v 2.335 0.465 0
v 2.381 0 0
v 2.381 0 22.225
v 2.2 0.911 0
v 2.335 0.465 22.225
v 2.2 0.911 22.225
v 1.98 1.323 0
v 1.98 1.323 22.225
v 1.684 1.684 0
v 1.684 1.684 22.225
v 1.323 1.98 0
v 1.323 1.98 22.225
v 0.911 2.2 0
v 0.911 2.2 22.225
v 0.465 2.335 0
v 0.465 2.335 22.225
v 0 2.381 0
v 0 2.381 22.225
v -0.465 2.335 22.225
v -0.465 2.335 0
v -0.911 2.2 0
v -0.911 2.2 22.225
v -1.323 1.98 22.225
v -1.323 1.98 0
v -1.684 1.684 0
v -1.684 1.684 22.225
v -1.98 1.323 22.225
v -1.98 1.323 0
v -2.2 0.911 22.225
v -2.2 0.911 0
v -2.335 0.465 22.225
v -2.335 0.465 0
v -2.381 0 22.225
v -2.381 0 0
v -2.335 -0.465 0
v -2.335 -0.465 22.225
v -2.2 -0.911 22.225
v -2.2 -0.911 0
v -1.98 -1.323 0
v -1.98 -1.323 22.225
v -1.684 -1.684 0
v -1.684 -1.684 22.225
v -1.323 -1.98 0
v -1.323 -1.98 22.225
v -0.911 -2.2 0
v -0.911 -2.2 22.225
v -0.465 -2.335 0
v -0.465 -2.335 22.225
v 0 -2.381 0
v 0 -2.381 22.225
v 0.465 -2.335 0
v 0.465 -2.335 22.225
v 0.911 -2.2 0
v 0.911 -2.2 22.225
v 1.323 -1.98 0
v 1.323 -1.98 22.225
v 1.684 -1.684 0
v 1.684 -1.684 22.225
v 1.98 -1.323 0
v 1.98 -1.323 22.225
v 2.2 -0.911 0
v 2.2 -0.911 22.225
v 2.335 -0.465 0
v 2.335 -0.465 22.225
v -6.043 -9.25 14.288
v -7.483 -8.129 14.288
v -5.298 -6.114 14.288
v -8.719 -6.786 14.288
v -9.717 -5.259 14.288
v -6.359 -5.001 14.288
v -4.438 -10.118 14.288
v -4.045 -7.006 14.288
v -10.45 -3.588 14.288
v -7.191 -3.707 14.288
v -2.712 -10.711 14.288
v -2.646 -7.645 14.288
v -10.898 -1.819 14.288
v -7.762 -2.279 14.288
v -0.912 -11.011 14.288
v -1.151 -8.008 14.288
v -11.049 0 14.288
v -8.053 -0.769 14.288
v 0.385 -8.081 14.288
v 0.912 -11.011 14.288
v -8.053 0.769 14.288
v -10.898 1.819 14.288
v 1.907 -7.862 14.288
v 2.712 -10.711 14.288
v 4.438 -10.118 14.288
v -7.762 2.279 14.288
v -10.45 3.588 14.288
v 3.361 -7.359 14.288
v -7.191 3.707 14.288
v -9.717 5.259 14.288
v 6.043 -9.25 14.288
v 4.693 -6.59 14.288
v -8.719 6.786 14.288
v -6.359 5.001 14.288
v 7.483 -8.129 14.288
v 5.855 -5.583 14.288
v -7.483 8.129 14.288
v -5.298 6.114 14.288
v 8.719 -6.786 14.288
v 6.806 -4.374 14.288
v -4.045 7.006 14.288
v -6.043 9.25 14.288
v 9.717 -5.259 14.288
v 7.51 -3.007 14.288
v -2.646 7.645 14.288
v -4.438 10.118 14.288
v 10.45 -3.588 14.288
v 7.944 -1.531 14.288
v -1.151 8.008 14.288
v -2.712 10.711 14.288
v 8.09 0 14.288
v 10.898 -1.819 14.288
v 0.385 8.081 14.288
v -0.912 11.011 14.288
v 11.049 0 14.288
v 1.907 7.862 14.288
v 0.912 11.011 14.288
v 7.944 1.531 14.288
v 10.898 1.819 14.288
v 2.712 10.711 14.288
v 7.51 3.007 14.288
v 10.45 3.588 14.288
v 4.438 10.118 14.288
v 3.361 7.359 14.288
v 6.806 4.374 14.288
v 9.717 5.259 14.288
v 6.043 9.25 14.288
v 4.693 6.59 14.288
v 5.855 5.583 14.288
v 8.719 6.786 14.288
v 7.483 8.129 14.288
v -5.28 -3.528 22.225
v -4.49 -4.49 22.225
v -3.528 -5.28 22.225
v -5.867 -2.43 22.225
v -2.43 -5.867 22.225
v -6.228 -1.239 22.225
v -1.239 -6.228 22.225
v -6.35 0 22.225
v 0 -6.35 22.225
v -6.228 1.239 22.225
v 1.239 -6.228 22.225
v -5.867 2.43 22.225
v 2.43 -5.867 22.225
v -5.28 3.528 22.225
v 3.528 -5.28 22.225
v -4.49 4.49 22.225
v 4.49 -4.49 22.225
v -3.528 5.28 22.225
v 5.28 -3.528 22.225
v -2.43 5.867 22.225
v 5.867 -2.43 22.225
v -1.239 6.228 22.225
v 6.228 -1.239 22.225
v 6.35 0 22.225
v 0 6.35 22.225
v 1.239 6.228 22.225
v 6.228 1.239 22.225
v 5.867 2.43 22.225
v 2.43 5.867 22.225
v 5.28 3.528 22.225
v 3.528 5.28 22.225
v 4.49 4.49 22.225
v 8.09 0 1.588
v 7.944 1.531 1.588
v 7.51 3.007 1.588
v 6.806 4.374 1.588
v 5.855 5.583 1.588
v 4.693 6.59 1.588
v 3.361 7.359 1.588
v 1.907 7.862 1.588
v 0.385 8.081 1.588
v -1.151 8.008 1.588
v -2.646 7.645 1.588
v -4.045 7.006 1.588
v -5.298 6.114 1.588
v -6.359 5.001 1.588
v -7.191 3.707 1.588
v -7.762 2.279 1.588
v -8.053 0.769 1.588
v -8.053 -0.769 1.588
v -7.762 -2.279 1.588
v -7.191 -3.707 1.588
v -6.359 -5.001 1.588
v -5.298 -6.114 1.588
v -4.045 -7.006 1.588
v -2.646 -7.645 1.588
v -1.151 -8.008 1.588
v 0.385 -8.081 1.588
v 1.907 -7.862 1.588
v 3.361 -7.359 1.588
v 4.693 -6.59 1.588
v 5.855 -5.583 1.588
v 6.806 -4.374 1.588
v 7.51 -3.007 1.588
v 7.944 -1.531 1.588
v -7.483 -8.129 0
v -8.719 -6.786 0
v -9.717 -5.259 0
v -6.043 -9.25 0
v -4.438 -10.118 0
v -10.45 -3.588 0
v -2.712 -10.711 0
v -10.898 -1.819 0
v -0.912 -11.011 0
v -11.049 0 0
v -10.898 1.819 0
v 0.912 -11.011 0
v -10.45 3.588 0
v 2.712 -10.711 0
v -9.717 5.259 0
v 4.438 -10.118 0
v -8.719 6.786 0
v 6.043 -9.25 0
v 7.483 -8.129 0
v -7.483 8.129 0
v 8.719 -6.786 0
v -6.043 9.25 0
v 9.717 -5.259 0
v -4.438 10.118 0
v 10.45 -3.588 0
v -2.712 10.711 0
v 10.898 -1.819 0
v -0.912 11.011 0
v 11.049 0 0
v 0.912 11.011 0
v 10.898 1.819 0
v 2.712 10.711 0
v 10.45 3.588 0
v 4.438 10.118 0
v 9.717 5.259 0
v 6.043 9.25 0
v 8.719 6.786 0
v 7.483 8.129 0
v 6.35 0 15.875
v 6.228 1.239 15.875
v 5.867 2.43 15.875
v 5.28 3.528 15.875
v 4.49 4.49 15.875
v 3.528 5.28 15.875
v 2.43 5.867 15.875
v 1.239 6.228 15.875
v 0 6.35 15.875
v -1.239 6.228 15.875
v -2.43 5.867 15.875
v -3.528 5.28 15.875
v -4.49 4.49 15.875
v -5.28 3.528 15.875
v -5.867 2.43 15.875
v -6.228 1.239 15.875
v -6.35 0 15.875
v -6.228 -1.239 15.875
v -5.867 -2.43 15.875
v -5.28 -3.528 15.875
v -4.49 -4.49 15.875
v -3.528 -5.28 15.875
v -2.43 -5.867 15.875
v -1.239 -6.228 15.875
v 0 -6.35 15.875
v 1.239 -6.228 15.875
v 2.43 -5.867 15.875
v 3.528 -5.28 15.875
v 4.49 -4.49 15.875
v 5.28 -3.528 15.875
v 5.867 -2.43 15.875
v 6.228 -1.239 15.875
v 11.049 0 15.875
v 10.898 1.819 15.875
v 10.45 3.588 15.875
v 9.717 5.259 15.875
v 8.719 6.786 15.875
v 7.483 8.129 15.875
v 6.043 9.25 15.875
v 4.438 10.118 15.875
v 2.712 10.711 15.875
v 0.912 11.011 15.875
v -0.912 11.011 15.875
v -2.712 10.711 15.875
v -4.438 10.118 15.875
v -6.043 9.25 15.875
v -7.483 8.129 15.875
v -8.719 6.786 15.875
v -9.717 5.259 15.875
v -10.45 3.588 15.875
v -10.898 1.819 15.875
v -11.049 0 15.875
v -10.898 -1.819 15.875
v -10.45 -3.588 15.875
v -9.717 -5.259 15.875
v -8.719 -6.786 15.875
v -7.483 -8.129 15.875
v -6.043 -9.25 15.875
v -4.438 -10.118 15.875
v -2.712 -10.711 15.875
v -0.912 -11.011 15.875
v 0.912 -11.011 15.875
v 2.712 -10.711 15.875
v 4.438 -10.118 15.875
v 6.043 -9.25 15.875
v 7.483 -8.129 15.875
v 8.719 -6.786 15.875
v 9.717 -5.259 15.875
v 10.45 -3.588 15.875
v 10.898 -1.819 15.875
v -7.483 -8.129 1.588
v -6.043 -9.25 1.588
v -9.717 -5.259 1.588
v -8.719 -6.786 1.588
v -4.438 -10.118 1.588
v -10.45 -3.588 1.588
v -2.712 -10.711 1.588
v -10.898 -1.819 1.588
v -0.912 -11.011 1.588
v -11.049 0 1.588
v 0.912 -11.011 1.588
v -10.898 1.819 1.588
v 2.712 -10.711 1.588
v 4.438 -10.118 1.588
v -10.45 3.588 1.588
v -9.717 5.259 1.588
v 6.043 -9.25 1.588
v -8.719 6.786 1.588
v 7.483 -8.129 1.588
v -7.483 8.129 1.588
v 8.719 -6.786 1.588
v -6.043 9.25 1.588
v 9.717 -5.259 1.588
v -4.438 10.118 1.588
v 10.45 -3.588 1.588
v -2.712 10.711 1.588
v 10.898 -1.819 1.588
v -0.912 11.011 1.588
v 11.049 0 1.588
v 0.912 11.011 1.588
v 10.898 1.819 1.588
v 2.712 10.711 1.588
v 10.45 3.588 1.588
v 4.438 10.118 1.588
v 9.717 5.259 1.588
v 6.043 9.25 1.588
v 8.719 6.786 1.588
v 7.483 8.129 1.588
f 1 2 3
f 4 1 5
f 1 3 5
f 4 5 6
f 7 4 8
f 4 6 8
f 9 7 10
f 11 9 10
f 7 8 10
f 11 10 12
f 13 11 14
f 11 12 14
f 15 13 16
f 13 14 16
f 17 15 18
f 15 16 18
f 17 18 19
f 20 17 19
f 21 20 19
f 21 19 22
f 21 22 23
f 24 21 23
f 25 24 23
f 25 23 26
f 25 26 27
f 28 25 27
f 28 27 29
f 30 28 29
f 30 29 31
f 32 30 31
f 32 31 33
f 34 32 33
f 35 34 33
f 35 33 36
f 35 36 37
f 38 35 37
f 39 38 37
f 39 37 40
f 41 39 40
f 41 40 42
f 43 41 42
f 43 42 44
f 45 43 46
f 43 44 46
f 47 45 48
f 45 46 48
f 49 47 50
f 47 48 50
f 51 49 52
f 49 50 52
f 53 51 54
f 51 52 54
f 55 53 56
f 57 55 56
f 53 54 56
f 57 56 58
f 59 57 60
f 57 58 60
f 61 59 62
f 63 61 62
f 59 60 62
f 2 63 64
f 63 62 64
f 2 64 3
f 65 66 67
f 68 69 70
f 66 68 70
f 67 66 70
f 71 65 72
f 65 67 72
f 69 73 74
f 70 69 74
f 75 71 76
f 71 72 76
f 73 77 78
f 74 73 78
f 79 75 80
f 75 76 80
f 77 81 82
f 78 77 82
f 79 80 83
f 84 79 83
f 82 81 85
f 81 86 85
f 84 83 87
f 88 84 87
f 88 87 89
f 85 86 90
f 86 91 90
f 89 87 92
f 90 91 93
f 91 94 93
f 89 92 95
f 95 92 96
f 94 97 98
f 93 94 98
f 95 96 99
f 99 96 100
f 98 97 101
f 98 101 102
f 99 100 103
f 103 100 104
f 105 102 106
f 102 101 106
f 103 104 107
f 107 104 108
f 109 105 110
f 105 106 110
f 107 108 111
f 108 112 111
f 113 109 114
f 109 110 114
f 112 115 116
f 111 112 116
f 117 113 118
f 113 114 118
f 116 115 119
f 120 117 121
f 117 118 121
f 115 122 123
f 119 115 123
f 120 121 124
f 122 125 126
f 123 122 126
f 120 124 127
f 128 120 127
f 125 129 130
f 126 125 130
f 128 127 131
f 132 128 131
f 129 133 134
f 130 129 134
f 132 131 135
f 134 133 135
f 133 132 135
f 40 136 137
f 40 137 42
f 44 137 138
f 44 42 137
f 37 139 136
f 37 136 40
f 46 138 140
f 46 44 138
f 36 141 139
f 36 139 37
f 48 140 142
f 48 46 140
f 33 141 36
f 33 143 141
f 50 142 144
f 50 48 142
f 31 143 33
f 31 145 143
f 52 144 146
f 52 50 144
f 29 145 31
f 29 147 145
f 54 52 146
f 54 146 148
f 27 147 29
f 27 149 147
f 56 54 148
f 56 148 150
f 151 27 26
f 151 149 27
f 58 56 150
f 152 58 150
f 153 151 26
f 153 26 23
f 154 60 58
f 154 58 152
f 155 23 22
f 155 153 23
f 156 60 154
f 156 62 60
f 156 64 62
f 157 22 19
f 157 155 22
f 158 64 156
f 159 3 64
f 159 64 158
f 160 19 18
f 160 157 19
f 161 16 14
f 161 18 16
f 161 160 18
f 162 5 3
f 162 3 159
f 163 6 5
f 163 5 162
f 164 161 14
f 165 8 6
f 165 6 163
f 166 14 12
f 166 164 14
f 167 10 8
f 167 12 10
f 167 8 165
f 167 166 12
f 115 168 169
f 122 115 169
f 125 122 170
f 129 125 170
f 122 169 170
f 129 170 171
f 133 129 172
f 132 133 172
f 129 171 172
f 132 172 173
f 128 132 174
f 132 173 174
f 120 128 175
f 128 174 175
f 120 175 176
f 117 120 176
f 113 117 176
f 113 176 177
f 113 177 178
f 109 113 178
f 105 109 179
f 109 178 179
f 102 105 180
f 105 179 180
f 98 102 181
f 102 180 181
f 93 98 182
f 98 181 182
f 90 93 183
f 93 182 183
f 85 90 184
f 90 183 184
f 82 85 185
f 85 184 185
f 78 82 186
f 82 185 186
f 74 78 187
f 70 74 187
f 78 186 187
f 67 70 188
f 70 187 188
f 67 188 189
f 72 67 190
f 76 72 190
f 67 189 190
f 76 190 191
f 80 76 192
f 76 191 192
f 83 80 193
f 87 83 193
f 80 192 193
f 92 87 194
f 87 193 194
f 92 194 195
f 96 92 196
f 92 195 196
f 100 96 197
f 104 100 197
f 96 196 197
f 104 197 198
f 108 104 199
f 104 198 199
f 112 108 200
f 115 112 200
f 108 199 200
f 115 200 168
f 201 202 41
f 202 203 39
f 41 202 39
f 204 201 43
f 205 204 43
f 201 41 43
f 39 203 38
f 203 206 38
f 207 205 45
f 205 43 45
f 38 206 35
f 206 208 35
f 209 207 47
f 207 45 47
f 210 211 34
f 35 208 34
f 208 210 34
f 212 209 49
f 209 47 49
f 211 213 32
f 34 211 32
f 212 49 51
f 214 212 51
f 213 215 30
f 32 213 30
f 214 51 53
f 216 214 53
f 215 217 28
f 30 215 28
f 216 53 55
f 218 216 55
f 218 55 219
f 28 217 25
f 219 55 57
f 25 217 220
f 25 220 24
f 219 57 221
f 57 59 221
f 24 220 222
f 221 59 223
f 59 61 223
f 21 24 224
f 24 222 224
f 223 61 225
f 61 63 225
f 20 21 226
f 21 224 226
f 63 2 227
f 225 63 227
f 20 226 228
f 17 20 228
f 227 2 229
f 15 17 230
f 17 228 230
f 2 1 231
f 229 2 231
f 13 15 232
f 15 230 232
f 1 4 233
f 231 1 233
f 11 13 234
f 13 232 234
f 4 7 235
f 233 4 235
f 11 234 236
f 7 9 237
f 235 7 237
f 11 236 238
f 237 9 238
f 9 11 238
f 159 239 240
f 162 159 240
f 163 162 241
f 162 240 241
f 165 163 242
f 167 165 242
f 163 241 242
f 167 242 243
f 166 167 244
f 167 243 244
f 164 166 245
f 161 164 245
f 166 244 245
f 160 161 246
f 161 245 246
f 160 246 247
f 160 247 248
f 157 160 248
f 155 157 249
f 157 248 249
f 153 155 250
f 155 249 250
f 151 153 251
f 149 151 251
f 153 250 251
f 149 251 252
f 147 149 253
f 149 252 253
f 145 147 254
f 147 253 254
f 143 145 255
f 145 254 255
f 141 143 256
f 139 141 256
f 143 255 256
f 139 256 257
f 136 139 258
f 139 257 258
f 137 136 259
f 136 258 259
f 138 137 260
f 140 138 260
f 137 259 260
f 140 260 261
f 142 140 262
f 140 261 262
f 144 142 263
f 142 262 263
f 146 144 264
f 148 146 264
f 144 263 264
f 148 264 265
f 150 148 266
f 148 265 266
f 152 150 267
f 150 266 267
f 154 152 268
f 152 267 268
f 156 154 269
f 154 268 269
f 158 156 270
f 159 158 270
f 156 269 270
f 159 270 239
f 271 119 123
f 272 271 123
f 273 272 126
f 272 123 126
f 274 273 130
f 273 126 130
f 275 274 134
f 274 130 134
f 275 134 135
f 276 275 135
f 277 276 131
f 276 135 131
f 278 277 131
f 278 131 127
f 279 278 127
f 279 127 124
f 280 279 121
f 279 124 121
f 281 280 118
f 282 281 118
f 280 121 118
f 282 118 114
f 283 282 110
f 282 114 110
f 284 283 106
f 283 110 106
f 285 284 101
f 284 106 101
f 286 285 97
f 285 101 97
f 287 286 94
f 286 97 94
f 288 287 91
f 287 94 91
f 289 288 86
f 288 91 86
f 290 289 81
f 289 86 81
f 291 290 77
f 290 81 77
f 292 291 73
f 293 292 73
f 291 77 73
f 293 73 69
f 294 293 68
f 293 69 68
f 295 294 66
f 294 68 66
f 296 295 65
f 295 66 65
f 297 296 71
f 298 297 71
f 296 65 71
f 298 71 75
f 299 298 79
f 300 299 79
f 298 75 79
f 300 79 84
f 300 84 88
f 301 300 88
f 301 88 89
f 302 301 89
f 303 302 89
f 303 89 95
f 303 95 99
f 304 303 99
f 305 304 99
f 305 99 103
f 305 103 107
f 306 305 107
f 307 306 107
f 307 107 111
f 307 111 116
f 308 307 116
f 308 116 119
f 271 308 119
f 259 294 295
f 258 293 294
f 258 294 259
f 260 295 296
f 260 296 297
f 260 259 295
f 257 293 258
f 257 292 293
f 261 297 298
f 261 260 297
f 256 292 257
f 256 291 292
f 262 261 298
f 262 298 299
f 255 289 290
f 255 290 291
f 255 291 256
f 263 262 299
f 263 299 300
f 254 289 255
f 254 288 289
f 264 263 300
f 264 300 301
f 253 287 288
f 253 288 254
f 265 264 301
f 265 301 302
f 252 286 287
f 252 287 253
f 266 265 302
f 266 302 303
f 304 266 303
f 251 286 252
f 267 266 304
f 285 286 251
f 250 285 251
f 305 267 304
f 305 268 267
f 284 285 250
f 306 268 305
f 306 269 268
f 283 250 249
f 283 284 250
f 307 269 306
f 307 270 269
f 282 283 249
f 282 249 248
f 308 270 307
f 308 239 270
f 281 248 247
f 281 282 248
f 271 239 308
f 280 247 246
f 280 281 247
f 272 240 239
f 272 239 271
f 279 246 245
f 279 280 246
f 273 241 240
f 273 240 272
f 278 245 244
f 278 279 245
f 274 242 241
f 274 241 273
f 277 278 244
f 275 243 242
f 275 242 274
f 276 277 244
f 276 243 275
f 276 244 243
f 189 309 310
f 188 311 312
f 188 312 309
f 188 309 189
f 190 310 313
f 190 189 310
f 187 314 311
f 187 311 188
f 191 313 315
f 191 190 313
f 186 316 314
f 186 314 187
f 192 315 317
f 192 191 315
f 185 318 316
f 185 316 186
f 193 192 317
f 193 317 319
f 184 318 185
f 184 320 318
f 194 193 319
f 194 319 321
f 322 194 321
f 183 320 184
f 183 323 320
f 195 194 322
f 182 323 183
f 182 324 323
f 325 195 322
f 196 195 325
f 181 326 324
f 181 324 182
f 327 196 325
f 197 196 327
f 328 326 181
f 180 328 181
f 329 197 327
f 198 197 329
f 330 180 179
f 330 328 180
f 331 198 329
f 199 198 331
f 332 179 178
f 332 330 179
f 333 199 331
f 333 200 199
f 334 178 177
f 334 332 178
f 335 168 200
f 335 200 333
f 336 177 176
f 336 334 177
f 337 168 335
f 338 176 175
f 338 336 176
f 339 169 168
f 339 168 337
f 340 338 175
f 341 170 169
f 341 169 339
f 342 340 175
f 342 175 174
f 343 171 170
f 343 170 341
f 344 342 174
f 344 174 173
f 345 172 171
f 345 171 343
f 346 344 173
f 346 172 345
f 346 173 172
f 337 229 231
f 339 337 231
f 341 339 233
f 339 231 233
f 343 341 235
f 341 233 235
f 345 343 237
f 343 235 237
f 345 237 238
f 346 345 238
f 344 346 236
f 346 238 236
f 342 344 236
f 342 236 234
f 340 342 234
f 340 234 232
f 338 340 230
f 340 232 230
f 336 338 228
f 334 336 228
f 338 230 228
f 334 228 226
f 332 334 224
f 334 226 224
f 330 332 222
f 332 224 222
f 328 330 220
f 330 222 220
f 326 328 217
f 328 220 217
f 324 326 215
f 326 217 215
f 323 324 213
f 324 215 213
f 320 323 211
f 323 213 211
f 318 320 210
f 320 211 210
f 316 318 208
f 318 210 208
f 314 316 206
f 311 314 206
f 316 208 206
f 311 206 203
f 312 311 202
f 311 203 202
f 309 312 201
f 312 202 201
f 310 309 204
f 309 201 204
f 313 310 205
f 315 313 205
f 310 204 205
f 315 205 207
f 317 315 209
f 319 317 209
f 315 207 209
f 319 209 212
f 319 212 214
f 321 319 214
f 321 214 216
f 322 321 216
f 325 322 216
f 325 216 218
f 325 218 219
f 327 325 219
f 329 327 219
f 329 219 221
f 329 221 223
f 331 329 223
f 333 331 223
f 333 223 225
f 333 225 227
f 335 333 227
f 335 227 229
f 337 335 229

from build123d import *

# Parameters (mm, degrees)
SKETCH1_R           = 11.049
BOSS_EXTRUDE1_DEPTH = 1.5875
SKETCH2_R           = 8.0899
BOSS_EXTRUDE2_DEPTH = 12.7
SKETCH3_R           = 11.049
BOSS_EXTRUDE3_DEPTH = 1.5875
SKETCH4_R           = 6.35
BOSS_EXTRUDE4_DEPTH = 6.35
SKETCH5_R           = 2.38125
CUT_EXTRUDE1_DEPTH  = 25.4


with BuildPart() as part:
    # Sketch1 → Boss-Extrude1 (new body)
    with BuildSketch(Plane.XY):
        Circle(SKETCH1_R)
    extrude(amount=BOSS_EXTRUDE1_DEPTH)

    # Sketch2 → Boss-Extrude2 (add)
    with BuildSketch(Plane.XY.offset(1.5875)):
        Circle(SKETCH2_R)
    extrude(amount=BOSS_EXTRUDE2_DEPTH)

    # Sketch3 → Boss-Extrude3 (add)
    with BuildSketch(Plane.XY.offset(14.2875)):
        Circle(SKETCH3_R)
    extrude(amount=BOSS_EXTRUDE3_DEPTH)

    # Sketch4 → Boss-Extrude4 (add)
    with BuildSketch(Plane.XY.offset(15.875)):
        Circle(SKETCH4_R)
    extrude(amount=BOSS_EXTRUDE4_DEPTH)

    # Sketch5 → Cut-Extrude1 (cut)
    with BuildSketch(Plane.XY.offset(22.225)):
        Circle(SKETCH5_R)
    extrude(amount=-CUT_EXTRUDE1_DEPTH, mode=Mode.SUBTRACT)


solid = part.part
